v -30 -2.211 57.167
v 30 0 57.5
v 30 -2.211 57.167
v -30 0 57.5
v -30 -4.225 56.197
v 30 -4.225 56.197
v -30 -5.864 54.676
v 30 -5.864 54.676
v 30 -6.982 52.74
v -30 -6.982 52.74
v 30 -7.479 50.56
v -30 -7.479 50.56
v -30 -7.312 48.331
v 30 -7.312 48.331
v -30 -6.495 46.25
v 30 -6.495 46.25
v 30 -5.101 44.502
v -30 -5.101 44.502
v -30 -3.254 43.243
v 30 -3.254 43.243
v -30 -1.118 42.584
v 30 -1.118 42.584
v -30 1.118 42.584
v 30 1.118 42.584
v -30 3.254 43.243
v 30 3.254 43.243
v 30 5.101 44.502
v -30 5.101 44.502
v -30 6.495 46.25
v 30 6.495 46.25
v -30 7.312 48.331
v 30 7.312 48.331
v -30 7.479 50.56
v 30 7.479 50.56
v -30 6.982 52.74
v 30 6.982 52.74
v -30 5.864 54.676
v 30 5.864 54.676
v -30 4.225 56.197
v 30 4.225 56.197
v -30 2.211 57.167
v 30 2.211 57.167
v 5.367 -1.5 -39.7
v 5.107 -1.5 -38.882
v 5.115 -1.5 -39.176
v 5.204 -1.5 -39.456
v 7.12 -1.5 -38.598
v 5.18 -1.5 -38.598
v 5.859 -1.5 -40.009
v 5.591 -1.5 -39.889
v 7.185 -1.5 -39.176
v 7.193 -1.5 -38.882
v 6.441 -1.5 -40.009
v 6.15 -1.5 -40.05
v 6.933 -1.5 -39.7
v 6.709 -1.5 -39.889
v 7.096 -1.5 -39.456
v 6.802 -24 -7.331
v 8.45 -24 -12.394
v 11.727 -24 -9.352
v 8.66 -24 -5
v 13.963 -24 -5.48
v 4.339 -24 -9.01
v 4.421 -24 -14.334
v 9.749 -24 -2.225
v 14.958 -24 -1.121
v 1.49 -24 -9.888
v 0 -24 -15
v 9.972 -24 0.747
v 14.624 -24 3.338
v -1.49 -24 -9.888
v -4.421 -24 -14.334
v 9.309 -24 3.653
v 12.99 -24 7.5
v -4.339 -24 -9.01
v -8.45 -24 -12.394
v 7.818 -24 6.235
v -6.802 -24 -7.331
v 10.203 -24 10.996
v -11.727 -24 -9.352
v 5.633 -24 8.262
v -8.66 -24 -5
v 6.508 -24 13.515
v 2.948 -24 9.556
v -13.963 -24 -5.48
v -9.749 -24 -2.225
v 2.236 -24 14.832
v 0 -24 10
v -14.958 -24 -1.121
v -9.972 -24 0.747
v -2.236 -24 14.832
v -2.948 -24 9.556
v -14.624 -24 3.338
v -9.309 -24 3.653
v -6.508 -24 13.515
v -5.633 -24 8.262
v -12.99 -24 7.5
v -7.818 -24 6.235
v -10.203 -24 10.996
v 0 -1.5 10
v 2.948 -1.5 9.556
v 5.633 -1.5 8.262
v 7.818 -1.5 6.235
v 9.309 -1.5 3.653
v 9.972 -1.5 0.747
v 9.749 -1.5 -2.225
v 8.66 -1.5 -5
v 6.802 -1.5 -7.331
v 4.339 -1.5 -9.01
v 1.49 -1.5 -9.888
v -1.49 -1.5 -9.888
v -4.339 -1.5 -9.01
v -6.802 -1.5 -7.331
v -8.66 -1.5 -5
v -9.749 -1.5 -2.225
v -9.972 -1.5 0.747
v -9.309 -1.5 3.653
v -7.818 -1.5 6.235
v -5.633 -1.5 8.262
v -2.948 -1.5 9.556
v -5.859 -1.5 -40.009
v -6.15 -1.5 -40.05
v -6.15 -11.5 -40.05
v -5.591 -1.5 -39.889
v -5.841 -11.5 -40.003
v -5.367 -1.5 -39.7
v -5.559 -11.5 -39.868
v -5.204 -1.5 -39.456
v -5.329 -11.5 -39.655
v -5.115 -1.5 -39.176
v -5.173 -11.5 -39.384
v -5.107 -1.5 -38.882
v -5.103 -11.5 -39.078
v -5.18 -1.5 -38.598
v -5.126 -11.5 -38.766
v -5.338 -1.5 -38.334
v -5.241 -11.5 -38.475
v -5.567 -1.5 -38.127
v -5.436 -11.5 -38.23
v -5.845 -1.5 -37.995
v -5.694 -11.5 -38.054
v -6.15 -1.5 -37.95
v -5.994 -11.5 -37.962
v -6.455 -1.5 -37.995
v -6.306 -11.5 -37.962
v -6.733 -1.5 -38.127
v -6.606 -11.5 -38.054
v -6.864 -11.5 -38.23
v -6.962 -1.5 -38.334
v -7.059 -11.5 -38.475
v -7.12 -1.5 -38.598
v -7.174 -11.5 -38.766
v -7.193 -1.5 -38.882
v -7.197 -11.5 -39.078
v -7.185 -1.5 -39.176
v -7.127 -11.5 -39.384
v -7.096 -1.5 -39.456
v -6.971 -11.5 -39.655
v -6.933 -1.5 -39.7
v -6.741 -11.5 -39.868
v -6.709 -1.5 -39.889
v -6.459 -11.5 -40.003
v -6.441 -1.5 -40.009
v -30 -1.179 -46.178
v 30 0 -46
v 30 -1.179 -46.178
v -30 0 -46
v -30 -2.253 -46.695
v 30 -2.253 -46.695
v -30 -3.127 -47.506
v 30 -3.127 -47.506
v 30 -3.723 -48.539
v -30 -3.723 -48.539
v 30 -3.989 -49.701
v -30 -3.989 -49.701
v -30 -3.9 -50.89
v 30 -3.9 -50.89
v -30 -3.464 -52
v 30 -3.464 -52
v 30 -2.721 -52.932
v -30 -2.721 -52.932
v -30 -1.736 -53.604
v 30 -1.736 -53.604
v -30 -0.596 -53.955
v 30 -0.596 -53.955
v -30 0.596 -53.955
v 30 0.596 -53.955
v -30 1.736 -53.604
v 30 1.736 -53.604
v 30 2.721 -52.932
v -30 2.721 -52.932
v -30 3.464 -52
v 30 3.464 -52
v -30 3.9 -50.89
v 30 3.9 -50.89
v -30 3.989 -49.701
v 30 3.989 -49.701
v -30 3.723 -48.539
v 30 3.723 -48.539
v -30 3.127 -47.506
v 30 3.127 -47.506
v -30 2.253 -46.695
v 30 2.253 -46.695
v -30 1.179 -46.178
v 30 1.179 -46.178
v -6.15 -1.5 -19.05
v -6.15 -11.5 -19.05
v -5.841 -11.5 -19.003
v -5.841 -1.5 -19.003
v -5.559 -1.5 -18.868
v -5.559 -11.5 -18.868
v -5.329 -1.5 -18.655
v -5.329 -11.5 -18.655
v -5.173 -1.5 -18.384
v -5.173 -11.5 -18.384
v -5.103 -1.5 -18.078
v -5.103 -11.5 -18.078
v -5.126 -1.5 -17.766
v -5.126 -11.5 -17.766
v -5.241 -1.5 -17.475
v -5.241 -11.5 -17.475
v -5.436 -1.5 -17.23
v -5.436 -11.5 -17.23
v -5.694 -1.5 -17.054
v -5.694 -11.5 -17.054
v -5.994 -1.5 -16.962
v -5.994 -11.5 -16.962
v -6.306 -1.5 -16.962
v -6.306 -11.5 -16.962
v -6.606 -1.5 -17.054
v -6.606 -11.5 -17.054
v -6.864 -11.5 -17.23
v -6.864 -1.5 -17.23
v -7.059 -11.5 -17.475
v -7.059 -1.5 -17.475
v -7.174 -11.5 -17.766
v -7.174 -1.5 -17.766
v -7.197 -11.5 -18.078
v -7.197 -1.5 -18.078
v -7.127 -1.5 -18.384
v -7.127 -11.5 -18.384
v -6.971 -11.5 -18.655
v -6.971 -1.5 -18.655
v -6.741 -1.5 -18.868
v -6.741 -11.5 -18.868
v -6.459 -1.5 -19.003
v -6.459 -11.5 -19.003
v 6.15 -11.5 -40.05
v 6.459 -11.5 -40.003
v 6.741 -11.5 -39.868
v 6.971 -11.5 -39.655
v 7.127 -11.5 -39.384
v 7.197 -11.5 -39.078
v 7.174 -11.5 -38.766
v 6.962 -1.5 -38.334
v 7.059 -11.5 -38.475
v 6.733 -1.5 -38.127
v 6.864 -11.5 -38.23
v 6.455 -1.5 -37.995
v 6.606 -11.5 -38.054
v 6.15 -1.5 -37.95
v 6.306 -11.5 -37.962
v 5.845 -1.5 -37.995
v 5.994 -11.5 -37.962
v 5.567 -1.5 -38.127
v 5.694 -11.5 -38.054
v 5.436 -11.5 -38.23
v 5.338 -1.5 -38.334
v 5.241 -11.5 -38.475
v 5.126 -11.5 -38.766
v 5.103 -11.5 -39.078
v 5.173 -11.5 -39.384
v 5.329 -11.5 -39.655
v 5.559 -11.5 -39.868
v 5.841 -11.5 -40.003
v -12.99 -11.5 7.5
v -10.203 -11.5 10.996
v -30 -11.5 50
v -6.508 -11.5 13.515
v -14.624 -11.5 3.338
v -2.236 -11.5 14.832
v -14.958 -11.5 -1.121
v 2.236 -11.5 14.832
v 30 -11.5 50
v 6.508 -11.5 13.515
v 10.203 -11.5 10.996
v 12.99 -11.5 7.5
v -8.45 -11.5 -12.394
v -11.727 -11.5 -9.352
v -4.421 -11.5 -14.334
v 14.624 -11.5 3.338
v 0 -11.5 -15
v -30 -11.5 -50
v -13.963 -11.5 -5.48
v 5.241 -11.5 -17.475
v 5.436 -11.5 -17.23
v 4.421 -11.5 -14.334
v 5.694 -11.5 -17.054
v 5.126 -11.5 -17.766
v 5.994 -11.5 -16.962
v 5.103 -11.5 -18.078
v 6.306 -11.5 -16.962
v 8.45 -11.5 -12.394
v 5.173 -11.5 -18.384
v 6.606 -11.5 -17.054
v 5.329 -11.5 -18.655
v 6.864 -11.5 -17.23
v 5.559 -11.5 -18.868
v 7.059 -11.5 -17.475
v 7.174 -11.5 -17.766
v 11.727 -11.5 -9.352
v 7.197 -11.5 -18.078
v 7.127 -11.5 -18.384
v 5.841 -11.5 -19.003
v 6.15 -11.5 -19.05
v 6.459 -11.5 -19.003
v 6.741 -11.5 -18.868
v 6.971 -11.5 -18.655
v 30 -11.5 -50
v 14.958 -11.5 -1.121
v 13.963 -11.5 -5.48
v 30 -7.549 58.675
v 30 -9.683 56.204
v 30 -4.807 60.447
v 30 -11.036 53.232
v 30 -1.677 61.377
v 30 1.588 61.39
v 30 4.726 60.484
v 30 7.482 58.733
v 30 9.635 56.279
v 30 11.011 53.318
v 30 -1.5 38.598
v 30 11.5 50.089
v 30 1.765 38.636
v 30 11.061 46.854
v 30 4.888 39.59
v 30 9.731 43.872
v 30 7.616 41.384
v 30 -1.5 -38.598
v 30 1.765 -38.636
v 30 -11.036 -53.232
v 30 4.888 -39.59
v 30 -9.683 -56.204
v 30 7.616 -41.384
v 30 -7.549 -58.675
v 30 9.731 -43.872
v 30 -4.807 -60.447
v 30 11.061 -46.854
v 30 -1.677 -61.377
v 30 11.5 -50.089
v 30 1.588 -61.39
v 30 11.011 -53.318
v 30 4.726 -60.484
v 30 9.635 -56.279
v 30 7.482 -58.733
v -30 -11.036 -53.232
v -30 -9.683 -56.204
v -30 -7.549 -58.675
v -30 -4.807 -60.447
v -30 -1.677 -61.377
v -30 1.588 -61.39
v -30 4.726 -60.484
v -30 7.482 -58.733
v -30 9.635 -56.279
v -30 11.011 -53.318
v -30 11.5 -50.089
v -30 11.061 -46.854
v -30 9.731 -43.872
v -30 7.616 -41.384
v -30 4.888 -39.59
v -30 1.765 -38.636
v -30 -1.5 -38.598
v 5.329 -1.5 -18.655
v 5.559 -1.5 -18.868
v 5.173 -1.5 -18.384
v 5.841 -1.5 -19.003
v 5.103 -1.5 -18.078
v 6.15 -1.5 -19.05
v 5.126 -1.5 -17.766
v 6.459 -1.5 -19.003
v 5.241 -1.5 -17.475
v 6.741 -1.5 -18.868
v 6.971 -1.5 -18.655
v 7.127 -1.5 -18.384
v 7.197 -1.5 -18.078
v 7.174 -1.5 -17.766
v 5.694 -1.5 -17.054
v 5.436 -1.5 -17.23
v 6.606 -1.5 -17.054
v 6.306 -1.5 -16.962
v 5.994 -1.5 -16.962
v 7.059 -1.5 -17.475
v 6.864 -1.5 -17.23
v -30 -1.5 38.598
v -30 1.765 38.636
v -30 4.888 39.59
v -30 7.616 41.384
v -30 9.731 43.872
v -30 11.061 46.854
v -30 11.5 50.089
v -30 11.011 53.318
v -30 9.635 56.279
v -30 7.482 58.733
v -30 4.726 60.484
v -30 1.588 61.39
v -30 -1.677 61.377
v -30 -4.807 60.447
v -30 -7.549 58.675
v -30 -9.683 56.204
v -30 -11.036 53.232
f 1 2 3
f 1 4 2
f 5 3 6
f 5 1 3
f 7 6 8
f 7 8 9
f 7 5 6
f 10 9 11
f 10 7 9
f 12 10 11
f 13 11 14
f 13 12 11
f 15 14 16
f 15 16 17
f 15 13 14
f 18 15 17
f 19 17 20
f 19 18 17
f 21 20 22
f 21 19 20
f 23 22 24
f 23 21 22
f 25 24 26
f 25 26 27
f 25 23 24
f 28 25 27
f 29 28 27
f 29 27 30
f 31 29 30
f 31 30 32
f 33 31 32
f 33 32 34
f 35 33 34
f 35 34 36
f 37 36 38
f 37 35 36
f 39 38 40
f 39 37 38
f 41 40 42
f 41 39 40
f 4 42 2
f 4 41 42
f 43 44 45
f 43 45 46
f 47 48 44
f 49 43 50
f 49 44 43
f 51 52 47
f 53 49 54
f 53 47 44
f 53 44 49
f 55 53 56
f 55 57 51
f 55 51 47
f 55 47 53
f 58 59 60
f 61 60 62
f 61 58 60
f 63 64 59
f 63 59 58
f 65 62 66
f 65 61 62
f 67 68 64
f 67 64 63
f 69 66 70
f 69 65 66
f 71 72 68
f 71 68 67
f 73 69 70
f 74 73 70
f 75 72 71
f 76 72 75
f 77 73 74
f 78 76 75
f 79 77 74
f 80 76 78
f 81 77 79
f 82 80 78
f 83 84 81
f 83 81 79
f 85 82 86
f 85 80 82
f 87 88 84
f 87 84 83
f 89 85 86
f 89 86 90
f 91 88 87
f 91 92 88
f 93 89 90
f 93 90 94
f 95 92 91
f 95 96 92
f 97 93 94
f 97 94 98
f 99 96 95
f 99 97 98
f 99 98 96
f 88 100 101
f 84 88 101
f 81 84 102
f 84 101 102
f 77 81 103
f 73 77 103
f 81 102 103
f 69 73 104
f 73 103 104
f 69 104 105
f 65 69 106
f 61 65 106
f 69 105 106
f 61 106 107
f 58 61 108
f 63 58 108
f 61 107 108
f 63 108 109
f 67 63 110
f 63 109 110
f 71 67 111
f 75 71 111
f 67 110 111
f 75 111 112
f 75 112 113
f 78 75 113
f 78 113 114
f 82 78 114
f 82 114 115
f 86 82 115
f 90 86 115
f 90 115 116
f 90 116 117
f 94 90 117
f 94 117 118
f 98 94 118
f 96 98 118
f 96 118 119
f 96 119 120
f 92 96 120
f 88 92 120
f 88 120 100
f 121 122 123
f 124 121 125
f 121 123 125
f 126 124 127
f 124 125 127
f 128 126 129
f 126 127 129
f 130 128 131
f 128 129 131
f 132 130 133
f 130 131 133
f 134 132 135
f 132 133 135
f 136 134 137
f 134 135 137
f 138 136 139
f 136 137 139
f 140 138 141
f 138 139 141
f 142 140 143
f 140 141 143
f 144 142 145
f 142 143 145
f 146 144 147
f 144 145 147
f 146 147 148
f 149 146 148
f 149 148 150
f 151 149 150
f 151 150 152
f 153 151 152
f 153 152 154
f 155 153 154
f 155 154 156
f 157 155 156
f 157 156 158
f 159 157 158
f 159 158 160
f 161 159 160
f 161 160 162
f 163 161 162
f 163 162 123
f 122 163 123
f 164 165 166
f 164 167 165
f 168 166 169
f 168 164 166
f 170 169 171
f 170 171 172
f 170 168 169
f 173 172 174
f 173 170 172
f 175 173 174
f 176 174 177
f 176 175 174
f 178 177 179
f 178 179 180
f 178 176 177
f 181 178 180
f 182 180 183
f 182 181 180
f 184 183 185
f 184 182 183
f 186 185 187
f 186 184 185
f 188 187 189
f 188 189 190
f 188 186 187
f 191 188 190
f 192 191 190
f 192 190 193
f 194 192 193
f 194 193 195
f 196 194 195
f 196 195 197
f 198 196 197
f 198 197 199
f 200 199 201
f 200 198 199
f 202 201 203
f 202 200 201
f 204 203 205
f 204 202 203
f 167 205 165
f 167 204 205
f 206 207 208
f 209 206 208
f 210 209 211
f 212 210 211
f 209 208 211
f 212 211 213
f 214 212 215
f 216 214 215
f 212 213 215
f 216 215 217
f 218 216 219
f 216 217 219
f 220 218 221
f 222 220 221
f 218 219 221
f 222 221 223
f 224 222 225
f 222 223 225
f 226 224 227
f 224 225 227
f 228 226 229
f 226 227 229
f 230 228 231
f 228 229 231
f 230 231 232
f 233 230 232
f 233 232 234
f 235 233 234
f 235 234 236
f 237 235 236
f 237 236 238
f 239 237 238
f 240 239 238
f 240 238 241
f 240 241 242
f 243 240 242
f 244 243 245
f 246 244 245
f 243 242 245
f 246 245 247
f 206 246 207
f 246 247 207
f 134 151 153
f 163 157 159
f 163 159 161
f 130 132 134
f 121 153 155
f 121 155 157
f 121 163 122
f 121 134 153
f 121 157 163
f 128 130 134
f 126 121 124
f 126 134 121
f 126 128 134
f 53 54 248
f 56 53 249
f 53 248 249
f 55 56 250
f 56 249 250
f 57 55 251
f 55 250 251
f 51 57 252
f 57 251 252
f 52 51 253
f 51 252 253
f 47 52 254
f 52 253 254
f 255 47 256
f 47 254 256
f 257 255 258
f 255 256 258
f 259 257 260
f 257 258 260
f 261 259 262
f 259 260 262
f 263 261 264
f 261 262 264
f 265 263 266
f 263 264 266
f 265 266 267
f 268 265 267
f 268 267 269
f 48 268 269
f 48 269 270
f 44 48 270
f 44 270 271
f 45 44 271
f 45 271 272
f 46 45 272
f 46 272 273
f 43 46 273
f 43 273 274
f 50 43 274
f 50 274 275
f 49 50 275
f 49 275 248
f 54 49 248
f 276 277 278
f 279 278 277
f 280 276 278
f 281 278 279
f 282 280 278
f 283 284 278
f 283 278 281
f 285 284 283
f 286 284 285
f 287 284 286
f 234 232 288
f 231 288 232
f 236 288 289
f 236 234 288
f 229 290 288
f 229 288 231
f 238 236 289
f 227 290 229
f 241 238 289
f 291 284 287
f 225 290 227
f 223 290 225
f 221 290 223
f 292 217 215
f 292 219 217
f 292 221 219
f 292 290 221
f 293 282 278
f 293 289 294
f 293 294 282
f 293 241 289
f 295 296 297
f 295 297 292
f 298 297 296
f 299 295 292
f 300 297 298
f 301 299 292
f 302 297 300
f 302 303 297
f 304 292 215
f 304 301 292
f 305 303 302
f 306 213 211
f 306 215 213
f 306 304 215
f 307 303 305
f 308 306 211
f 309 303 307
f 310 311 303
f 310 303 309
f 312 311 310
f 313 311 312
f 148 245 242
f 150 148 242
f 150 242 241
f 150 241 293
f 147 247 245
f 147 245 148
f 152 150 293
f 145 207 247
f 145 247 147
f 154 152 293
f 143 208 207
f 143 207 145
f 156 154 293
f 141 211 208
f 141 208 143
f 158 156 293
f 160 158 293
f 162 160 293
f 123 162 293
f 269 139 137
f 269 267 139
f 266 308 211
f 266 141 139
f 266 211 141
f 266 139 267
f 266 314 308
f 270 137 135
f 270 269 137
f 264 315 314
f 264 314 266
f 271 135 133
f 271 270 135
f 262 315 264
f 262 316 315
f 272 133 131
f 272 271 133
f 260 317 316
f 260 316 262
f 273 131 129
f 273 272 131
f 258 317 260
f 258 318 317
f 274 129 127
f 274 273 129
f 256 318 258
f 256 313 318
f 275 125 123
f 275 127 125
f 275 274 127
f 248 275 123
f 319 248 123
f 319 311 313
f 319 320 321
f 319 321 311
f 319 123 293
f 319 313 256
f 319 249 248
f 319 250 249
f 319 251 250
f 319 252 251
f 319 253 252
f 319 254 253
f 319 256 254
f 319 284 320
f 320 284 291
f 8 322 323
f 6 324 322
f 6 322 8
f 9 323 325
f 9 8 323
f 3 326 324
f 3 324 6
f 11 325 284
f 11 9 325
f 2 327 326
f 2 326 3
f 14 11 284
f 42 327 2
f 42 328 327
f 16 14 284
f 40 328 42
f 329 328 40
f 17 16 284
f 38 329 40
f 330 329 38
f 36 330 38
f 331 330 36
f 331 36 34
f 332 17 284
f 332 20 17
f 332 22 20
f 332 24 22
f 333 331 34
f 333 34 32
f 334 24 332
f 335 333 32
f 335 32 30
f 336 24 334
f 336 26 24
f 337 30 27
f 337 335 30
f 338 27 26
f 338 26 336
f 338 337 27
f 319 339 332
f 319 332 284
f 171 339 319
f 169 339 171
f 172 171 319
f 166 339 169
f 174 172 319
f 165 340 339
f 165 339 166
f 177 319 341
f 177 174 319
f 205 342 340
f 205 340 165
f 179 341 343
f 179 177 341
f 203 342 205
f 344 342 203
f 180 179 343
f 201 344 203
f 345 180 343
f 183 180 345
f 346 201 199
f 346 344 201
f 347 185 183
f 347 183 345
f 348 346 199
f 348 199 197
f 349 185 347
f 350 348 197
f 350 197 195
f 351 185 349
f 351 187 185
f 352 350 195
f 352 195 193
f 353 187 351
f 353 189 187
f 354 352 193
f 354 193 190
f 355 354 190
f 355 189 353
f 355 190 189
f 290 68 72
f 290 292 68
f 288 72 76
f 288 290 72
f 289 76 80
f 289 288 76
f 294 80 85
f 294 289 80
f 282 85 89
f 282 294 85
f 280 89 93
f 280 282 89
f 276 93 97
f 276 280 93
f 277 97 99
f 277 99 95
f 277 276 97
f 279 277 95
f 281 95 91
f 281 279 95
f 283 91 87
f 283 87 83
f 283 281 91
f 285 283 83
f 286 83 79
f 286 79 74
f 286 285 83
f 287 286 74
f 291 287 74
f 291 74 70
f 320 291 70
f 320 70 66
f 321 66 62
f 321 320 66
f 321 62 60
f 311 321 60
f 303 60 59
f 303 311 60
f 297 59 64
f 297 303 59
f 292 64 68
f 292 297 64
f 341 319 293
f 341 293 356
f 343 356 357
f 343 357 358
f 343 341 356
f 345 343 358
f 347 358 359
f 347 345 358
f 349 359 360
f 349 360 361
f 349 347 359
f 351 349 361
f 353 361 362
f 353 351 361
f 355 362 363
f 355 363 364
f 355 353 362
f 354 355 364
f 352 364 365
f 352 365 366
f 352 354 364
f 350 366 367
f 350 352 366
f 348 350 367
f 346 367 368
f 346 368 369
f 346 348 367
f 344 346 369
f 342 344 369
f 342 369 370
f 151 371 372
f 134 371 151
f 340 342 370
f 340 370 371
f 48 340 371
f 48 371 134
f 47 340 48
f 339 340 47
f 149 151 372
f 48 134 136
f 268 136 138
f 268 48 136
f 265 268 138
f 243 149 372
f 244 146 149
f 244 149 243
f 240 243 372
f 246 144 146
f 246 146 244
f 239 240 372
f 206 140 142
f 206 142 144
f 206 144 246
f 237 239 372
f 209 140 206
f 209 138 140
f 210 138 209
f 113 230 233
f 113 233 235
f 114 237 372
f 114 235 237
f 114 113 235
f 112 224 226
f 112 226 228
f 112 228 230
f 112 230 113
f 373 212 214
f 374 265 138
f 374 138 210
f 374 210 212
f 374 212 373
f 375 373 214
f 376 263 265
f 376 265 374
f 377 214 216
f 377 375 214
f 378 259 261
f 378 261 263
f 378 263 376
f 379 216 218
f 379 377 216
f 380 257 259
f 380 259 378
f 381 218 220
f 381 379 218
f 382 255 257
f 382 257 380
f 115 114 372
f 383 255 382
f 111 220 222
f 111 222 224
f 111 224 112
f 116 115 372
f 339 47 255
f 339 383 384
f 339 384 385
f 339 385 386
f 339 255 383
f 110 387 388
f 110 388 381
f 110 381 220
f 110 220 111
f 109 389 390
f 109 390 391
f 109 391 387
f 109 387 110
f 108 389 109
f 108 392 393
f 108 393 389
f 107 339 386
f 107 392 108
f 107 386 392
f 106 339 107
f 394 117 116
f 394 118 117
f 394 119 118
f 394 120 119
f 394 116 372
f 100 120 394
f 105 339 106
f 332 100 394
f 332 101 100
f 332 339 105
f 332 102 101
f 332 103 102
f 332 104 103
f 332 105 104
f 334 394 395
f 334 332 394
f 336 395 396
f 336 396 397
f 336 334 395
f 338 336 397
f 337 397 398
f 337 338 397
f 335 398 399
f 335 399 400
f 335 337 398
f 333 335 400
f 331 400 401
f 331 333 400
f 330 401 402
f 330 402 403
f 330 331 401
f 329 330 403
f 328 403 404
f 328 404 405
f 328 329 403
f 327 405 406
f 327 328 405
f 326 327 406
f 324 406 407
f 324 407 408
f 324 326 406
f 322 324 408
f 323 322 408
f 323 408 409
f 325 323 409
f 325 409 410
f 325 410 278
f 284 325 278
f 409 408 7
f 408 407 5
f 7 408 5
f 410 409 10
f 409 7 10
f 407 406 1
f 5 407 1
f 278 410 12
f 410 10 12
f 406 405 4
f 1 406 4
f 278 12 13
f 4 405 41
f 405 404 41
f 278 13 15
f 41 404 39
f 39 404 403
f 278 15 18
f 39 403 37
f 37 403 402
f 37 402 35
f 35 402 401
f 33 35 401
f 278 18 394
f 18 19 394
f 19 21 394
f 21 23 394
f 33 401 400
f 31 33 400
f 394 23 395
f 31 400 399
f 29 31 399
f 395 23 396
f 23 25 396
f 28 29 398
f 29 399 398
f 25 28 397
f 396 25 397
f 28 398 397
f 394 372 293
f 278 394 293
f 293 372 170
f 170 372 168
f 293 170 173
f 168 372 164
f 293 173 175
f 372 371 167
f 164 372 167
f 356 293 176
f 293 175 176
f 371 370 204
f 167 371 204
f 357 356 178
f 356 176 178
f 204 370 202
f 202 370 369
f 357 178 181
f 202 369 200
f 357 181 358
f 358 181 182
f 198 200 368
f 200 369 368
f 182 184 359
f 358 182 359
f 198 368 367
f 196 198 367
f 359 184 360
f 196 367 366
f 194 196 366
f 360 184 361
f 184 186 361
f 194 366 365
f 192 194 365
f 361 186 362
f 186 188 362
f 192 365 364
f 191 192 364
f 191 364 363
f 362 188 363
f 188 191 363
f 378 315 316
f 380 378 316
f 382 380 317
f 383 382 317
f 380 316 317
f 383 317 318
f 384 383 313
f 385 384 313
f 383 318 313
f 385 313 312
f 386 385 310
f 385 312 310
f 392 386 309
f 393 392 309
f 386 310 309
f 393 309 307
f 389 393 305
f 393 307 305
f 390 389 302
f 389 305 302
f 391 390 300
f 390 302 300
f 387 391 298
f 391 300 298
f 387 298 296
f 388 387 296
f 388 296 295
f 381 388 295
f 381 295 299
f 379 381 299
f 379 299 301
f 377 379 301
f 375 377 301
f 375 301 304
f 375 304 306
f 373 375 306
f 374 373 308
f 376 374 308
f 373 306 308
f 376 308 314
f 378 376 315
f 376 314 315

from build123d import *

# Parameters (mm, degrees)
SKETCH1_R           = 7.5
SKETCH1_R_2         = 4
BOSS_EXTRUDE1_DEPTH = 30
SKETCH2_W           = 15
SKETCH2_H           = 12.5
SKETCH3_R           = 10
CUT_EXTRUDE1_DEPTH  = 73.031243221
SKETCH4_R           = 1.05
CUT_EXTRUDE2_DEPTH  = 10


with BuildPart() as part:
    # Sketch1 → Boss-Extrude1 (new, symmetric)
    with BuildSketch(Plane(origin=(0, 0, 0), x_dir=(0, 0, -1), z_dir=(1, 0, 0))):
        with BuildLine():
            Line((-50, -11.5), (50, -11.5))
            ThreePointArc((50, -11.5), (57.582875444, 8.645808233), (38.598245749, -1.5))
            Line((38.598245749, -1.5), (-38.598245749, -1.5))
            ThreePointArc((-38.598245749, -1.5), (-57.582875444, 8.645808233), (-50, -11.5))
        make_face()
        with Locations(Location((-50, 0, 0), (0, 0, 180))):
            Circle(SKETCH1_R, mode=Mode.SUBTRACT)
        with Locations(Location((50, 0, 0), (0, 0, 180))):
            Circle(SKETCH1_R_2, mode=Mode.SUBTRACT)
    extrude(amount=BOSS_EXTRUDE1_DEPTH, both=True)

    # Sketch2 → Revolve1 (revolve)
    with BuildSketch(Plane(origin=(0, 0, 0), x_dir=(0, 0, -1), z_dir=(1, 0, 0))):
        with Locations((7.5, -17.75)):
            Rectangle(SKETCH2_W, SKETCH2_H)
    revolve(axis=Axis((0, -24, 0), (0, 1, 0)))

    # Sketch3 → Cut-Extrude1 (cut, through all)
    with BuildSketch(Plane(origin=(0, -1.5, 0), x_dir=(1, 0, 0), z_dir=(0, 1, 0))):
        with Locations(Location((0, 0, 0), (0, 0, 270))):
            Circle(SKETCH3_R)
    extrude(amount=-CUT_EXTRUDE1_DEPTH, mode=Mode.SUBTRACT)

    # Sketch4 → Cut-Extrude2 (cut)
    with BuildSketch(Plane.XZ.offset(11.5)):
        with Locations(Location((-6.15, -18, 0), (0, 0, 270))):
            Circle(SKETCH4_R)
        with Locations(Location((-6.15, -39, 0), (0, 0, 270))):
            Circle(SKETCH4_R)
        with Locations(Location((6.15, -18, 0), (0, 0, 270))):
            Circle(SKETCH4_R)
        with Locations(Location((6.15, -39, 0), (0, 0, 270))):
            Circle(SKETCH4_R)
    extrude(amount=-CUT_EXTRUDE2_DEPTH, mode=Mode.SUBTRACT)


solid = part.part
